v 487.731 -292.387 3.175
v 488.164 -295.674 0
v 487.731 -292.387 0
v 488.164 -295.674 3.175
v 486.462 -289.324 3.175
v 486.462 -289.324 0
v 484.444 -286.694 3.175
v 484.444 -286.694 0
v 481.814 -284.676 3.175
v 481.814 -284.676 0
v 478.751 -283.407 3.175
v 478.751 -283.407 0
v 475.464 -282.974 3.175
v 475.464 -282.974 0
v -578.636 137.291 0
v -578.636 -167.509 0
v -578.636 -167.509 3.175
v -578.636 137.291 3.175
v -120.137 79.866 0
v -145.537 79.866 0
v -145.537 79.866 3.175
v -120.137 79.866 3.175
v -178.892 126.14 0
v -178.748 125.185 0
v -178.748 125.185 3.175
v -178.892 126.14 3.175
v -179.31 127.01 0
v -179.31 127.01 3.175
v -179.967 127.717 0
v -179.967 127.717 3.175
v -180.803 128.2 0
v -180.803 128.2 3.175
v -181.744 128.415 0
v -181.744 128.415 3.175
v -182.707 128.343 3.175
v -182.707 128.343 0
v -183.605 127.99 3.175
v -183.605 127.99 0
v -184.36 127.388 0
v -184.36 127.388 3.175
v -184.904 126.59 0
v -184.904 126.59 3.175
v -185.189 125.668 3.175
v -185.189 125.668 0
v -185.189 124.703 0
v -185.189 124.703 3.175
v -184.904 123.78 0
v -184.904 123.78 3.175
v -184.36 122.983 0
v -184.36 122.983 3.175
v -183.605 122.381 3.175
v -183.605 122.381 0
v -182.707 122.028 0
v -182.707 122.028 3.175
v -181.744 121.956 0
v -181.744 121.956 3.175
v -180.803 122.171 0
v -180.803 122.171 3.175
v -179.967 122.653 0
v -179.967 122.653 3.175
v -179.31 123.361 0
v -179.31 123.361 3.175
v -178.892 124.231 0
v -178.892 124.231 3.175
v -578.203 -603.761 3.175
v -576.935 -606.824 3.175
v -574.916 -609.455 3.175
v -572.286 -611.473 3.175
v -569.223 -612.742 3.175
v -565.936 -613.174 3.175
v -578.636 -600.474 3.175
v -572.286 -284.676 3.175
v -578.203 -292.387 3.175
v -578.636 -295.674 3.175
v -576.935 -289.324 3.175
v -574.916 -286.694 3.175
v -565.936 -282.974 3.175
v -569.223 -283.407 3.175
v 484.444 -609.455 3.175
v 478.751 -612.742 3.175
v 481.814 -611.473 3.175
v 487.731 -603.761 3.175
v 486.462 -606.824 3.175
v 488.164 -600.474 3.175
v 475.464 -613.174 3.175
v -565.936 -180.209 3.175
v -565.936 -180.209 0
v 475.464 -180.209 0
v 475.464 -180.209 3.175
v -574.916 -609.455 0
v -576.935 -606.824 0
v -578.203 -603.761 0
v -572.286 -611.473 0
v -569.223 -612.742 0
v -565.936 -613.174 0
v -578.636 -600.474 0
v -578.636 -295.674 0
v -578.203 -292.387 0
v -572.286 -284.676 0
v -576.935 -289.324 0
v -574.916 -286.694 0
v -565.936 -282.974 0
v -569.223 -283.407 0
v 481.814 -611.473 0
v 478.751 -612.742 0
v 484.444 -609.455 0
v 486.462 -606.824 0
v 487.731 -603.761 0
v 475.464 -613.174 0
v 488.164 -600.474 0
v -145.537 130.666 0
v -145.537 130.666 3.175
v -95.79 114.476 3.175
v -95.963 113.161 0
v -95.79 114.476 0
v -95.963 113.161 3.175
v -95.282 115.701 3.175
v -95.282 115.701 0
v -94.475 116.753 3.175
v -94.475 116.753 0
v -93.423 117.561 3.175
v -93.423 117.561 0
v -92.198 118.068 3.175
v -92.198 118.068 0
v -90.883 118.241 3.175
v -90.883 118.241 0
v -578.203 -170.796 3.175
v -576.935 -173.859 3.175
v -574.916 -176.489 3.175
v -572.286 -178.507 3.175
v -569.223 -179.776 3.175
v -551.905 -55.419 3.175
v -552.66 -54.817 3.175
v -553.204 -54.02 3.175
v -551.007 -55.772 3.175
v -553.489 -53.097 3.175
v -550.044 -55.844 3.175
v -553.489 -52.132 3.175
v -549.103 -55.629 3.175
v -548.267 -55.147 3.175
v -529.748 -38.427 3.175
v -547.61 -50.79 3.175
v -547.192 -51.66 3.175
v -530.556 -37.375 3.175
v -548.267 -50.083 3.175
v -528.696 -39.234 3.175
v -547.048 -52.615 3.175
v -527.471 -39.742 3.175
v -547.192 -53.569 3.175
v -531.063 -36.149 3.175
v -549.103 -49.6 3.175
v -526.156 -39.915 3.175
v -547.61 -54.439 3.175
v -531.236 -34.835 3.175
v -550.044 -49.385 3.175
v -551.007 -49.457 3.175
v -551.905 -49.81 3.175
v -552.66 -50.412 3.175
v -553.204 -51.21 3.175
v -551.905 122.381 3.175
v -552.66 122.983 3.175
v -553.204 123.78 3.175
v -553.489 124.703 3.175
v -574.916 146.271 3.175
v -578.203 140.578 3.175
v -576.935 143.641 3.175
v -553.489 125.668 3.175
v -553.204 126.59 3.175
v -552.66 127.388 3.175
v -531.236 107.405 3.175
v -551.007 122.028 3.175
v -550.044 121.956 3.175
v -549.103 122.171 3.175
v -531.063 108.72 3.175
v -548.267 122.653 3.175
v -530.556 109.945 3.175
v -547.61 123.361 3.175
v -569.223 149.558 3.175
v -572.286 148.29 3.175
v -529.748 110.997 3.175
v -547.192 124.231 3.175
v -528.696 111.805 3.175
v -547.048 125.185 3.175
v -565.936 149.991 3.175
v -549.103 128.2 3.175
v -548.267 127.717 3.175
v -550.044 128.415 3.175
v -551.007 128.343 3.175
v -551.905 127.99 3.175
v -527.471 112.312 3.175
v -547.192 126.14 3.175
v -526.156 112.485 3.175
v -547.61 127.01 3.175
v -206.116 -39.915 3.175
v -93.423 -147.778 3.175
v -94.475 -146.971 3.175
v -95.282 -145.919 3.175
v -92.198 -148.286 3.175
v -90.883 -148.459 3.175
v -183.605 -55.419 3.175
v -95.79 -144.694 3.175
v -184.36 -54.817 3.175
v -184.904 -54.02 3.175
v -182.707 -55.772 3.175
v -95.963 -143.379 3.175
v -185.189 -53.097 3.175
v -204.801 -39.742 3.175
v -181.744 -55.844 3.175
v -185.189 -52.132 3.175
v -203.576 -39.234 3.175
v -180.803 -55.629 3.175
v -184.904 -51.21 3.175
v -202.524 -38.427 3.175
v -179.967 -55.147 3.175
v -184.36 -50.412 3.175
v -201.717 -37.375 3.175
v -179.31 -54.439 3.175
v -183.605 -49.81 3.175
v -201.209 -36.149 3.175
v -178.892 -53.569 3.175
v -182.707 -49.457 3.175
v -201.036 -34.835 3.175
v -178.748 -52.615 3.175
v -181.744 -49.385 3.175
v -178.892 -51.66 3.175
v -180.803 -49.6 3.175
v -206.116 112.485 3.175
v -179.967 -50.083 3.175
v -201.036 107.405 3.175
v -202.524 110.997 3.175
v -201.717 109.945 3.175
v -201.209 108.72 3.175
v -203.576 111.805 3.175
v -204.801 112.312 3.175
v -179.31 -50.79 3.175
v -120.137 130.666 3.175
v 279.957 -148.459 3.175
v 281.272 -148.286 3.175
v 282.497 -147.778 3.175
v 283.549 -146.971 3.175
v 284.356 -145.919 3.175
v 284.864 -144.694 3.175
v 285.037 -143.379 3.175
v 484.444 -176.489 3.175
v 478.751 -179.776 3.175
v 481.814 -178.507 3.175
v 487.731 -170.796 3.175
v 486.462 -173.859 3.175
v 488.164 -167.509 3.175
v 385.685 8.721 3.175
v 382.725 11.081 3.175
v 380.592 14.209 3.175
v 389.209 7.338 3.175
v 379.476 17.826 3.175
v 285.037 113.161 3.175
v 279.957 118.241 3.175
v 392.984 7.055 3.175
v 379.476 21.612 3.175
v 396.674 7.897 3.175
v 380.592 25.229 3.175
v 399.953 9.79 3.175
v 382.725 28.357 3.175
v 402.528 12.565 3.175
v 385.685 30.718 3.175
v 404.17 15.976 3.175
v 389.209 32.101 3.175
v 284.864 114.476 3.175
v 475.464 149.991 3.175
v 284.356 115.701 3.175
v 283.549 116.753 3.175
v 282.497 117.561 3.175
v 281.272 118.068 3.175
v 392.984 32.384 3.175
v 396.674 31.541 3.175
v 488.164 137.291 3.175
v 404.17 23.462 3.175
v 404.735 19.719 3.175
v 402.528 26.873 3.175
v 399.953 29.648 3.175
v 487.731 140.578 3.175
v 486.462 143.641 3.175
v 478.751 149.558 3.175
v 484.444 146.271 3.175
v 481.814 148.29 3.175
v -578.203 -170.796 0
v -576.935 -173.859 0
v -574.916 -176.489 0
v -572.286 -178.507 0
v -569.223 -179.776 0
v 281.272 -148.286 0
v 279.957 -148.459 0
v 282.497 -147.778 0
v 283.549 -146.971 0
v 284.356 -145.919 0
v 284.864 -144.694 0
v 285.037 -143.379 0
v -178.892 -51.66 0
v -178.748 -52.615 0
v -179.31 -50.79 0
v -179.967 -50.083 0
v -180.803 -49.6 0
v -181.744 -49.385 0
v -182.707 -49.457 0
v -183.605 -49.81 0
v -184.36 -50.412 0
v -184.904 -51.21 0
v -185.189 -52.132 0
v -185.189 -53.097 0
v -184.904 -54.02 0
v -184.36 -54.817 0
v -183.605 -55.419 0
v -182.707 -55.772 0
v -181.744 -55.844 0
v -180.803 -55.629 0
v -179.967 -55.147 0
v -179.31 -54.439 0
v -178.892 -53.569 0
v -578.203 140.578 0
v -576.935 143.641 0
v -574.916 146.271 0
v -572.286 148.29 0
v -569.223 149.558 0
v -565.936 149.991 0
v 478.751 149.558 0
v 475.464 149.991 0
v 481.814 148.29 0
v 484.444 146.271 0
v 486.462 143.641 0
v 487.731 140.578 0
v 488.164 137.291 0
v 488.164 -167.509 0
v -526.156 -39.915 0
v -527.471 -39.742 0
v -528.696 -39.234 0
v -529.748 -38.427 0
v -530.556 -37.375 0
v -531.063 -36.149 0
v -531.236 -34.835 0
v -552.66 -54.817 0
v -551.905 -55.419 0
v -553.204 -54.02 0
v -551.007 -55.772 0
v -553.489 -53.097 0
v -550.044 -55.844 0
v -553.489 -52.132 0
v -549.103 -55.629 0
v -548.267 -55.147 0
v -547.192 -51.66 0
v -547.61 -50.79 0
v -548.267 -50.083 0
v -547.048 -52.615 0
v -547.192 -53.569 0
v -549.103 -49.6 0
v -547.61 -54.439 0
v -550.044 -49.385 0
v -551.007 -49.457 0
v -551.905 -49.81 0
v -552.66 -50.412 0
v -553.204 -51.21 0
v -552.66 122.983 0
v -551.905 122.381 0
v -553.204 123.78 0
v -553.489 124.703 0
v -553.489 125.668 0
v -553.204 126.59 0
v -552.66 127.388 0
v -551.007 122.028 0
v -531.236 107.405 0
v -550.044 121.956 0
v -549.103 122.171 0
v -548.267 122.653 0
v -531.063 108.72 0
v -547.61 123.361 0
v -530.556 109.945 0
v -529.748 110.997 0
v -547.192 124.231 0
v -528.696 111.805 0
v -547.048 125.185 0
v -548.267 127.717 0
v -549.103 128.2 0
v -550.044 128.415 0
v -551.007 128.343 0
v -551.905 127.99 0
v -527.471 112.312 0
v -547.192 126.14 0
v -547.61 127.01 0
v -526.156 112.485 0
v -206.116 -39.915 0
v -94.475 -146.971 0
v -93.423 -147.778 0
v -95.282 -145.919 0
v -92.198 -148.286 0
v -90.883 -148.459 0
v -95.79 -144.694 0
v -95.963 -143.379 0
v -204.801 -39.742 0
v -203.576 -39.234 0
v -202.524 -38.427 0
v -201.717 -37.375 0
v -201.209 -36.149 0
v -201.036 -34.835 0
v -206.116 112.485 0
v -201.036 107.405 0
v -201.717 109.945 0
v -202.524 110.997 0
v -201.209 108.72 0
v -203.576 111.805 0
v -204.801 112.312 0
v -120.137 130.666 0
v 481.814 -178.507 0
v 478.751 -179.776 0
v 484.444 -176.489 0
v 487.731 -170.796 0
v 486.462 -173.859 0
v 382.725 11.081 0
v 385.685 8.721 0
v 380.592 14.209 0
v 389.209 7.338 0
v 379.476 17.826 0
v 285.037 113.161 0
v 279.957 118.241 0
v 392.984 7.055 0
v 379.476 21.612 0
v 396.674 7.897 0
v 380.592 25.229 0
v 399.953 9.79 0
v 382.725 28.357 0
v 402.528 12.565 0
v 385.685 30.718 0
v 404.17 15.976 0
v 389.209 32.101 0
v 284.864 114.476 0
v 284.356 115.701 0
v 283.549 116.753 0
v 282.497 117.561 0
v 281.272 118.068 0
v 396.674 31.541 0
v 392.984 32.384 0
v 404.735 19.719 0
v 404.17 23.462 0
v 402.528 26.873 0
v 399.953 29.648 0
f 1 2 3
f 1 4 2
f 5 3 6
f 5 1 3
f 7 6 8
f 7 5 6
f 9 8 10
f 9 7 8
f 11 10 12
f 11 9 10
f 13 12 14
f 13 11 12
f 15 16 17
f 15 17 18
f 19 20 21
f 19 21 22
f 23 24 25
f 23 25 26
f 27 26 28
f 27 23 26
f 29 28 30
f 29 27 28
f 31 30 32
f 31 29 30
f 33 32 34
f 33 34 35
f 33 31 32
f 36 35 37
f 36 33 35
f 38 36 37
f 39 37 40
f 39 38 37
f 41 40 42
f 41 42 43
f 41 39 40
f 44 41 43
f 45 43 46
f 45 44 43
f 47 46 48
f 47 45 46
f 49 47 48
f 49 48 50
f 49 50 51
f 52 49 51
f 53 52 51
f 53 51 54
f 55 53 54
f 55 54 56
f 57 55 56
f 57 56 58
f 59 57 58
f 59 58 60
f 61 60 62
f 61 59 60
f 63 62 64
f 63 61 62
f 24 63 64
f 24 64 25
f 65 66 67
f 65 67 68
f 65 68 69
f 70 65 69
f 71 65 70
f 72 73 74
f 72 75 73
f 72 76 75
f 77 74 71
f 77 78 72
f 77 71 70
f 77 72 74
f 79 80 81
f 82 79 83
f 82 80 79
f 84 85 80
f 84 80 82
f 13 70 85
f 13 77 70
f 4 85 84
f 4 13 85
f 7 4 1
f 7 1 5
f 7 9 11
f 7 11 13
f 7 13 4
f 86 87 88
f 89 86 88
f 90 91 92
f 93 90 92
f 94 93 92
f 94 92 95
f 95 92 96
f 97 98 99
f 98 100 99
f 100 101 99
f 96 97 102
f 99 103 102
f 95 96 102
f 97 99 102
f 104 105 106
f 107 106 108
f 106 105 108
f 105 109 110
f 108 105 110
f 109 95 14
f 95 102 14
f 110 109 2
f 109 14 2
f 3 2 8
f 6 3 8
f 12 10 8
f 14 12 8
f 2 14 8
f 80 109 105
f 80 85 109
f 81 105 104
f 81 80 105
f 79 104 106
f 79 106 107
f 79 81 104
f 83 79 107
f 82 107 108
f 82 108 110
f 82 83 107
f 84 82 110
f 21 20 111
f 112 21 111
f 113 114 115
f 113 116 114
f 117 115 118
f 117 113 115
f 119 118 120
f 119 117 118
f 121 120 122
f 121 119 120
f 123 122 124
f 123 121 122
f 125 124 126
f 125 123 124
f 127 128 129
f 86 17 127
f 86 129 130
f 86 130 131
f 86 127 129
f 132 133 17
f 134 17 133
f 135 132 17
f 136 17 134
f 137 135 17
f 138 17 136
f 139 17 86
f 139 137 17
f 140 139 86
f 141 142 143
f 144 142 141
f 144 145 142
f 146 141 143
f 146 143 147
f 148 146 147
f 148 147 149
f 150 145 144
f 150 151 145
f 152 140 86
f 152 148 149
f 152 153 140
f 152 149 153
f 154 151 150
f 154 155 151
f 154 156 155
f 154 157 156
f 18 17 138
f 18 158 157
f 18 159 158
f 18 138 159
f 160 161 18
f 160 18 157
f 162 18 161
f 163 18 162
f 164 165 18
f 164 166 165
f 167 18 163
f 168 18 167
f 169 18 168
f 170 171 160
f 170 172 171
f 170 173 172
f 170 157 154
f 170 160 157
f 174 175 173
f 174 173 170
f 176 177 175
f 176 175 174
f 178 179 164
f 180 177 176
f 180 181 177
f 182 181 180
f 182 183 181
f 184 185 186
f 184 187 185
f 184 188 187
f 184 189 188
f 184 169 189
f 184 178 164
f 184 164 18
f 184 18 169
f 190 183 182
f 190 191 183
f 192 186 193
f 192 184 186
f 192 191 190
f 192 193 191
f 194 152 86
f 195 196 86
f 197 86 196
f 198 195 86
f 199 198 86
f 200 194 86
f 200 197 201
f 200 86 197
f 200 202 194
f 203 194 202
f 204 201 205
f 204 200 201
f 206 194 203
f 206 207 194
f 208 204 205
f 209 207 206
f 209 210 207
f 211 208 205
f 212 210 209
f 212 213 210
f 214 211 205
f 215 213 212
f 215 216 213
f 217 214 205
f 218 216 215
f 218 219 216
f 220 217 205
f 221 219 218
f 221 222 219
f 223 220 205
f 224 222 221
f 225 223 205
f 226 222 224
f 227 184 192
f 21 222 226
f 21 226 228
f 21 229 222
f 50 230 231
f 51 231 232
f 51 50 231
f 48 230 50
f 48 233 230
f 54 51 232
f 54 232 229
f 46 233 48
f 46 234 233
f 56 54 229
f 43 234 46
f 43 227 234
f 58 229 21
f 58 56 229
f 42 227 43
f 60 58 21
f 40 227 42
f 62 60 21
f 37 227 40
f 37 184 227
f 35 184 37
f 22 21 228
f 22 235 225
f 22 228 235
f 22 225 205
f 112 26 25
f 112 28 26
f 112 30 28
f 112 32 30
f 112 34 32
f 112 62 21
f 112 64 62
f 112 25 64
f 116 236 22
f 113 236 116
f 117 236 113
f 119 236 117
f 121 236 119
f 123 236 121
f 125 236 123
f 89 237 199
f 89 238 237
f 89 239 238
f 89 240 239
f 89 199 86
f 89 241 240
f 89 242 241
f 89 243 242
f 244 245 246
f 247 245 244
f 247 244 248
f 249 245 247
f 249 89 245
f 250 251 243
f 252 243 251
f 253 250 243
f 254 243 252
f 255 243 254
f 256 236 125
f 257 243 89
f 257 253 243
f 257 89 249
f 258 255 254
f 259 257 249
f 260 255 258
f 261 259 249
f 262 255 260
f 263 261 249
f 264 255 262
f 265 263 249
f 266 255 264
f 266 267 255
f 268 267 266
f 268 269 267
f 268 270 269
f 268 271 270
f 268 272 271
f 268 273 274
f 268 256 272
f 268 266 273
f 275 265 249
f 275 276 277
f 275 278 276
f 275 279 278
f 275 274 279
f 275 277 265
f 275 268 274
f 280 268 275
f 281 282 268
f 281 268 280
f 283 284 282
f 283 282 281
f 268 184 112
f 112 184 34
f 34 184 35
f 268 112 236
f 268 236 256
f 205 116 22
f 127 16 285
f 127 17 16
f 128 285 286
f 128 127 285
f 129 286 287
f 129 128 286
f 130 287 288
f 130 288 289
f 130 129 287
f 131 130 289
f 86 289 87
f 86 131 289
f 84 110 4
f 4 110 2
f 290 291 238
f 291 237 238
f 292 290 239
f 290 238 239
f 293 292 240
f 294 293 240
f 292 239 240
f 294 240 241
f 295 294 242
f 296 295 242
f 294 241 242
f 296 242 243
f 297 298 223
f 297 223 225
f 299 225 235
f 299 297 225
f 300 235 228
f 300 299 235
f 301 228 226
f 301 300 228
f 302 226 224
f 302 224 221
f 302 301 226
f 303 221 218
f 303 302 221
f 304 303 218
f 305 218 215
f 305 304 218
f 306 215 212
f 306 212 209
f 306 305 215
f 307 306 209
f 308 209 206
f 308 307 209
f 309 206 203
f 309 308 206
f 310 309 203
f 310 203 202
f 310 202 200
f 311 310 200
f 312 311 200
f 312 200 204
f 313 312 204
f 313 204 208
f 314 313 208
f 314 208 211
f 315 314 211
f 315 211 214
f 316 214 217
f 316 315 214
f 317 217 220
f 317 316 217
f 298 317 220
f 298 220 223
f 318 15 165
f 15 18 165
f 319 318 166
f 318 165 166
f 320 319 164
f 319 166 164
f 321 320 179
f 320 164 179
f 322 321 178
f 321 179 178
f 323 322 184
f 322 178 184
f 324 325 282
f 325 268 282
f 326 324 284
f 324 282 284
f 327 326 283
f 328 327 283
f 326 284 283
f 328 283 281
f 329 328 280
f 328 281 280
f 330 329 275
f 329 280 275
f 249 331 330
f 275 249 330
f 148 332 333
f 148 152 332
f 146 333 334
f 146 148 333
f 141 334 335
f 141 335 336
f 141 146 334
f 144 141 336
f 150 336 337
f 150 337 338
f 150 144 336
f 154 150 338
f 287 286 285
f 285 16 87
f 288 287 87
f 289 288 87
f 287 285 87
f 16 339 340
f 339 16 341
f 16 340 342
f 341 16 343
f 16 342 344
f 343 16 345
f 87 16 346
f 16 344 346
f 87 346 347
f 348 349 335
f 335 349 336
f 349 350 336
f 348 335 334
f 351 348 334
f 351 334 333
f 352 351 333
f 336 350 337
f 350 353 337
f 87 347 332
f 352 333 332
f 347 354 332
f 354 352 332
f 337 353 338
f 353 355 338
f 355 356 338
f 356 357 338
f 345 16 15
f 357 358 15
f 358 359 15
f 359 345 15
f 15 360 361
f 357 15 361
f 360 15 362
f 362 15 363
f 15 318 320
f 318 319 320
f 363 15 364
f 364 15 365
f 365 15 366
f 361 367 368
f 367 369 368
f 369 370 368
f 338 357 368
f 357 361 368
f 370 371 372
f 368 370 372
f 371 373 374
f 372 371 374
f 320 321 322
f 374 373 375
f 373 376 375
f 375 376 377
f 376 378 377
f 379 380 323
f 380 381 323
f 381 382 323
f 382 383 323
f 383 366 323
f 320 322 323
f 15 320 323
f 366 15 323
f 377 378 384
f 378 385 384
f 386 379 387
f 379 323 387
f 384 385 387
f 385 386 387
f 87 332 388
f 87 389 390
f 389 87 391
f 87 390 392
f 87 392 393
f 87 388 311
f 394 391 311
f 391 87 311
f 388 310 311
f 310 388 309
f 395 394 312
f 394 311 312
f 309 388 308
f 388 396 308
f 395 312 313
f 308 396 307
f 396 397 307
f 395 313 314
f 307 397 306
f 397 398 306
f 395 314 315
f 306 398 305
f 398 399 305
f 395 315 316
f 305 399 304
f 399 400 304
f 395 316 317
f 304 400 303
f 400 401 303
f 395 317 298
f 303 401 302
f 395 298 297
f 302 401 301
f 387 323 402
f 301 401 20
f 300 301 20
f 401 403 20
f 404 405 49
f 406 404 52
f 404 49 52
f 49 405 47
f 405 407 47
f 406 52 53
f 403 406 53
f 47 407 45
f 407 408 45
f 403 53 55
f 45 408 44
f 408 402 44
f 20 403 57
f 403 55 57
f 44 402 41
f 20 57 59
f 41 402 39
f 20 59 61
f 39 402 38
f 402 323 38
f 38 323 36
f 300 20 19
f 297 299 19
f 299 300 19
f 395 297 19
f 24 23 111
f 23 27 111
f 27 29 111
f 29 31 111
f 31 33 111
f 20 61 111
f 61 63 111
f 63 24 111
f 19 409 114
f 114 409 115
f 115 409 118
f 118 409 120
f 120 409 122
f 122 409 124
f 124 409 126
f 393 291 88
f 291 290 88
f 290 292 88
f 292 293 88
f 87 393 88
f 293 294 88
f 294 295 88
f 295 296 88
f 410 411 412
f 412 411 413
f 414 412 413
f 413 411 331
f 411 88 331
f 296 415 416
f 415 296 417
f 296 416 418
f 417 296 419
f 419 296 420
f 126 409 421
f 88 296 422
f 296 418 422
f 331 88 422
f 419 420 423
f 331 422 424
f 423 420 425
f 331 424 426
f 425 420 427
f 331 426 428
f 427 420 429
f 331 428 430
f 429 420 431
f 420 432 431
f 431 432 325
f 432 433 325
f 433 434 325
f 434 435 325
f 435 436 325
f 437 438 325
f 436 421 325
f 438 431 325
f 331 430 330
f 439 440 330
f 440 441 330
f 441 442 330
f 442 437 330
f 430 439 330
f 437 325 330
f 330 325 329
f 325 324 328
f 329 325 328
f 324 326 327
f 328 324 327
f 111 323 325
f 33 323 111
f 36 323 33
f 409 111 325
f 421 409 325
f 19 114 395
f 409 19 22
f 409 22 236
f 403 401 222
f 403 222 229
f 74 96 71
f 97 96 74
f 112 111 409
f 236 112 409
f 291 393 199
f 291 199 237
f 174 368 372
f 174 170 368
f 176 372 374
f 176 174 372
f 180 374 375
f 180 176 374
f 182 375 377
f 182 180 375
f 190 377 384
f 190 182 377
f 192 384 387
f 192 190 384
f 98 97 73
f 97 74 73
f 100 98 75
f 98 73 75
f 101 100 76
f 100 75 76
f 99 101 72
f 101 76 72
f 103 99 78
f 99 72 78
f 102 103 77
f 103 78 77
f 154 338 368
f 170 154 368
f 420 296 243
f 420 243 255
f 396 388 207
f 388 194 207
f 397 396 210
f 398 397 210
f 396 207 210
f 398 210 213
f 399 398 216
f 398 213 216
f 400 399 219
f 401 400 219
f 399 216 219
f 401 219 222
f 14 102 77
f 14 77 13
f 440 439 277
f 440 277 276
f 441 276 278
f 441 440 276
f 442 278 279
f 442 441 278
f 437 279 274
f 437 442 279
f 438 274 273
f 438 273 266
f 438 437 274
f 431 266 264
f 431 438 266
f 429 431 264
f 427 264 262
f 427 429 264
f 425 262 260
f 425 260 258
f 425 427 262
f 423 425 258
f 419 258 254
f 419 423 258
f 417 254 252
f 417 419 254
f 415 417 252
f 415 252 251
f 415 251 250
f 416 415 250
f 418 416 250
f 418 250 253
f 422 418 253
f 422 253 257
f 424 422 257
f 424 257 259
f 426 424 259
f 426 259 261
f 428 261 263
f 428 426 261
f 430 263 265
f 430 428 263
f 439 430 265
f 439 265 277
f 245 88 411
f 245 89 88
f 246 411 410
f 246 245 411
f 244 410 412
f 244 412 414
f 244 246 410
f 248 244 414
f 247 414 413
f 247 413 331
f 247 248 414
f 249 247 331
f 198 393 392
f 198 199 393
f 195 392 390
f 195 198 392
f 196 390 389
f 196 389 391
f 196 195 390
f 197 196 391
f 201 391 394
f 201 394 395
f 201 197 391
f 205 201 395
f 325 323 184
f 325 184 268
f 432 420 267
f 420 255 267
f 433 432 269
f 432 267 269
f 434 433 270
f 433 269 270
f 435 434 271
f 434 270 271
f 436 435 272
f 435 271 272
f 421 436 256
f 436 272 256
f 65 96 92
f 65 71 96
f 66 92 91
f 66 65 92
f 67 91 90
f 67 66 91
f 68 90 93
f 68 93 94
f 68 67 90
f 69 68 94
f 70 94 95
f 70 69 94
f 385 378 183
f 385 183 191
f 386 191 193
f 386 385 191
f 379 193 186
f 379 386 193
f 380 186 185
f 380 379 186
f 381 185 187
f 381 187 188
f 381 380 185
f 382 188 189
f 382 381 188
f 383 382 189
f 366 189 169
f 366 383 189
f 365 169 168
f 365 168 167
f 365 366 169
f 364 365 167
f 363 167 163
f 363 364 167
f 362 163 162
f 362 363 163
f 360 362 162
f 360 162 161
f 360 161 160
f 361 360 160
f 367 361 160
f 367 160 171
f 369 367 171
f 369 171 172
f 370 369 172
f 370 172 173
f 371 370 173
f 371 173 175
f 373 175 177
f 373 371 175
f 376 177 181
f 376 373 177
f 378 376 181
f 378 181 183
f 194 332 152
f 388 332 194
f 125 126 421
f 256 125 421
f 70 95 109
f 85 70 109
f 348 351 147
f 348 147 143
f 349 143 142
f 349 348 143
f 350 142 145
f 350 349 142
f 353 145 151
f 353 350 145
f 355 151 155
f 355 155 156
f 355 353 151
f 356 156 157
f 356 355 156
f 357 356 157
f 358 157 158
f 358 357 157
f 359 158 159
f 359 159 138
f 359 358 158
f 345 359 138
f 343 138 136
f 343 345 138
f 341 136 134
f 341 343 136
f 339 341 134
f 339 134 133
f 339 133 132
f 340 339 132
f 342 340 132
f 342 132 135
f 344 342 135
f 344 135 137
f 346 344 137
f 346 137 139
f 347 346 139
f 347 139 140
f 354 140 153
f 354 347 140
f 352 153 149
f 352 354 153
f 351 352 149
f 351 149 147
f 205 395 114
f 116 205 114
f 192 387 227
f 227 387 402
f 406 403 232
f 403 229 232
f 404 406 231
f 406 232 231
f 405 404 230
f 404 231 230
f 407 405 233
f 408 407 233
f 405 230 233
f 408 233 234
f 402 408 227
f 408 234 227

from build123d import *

# Parameters (mm, degrees)
F0_W     = 1066.8
F0_H     = 330.2
F0_R     = 3.2385
F0_W_2   = 330.2
F0_H_2   = 152.4
F0_W_3   = 25.4
F0_H_3   = 50.8
F0_W_4   = 381
F0_H_4   = 266.7
F0_R_2   = 12.7
F1_DEPTH = 3.175
F2_DEPTH = 3.175
F3_R     = 5.08
F4_R     = 12.7
F4_2_R   = 12.7


with BuildPart() as f1:
    # F0 (on Top) → F1 (new body)
    with BuildSketch(Plane.XY):
        with Locations((-45.236103, -15.10883)):
            Rectangle(F0_W, F0_H)
        with Locations((-550.286172, -52.614683)):
            Circle(F0_R, mode=Mode.SUBTRACT)
        with Locations((-181.986172, -52.614683)):
            Circle(F0_R, mode=Mode.SUBTRACT)
        with Locations((-366.136172, 36.285317)):
            Rectangle(F0_W_2, F0_H_2, mode=Mode.SUBTRACT)
        with Locations((-550.286172, 125.185317)):
            Circle(F0_R, mode=Mode.SUBTRACT)
        with Locations((-181.986172, 125.185317)):
            Circle(F0_R, mode=Mode.SUBTRACT)
        with Locations((-132.837489, 105.265893)):
            Rectangle(F0_W_3, F0_H_3, mode=Mode.SUBTRACT)
        with Locations((94.536968, -15.10883)):
            Rectangle(F0_W_4, F0_H_4, mode=Mode.SUBTRACT)
        with Locations((392.03462, 19.719087)):
            Circle(F0_R_2, mode=Mode.SUBTRACT)
    extrude(amount=F1_DEPTH)

    # F3
    f3_edges = [f1.edges().sort_by_distance(p)[0] for p in [
        (-531.236172, 112.485317, 1.5875),
        (-531.236172, -39.914683, 1.5875),
        (-201.036172, -39.914683, 1.5875),
        (-201.036172, 112.485317, 1.5875),
        (-95.963032, 118.24117, 1.5875),
        (-95.963032, -148.45883, 1.5875),
        (285.036968, -148.45883, 1.5875),
        (285.036968, 118.24117, 1.5875),
    ]]
    fillet(f3_edges, radius=F3_R)

    # F4
    f4_edges = [f1.edges().sort_by_distance(p)[0] for p in [
        (-578.636103, 149.99117, 1.5875),
        (-578.636103, -180.20883, 1.5875),
        (488.163897, -180.20883, 1.5875),
        (488.163897, 149.99117, 1.5875),
    ]]
    fillet(f4_edges, radius=F4_R)


with BuildPart() as f2:
    # F0 (on Top) → F2 (new body)
    with BuildSketch(Plane.XY):
        with Locations((-45.236103, -448.074284)):
            Rectangle(F0_W, F0_H)
    extrude(amount=F2_DEPTH)

    # F4#2
    f4_2_edges = [f2.edges().sort_by_distance(p)[0] for p in [
        (-578.636103, -282.974284, 1.5875),
        (-578.636103, -613.174284, 1.5875),
        (488.163897, -613.174284, 1.5875),
        (488.163897, -282.974284, 1.5875),
    ]]
    fillet(f4_2_edges, radius=F4_2_R)


solid = Compound([f1.part, f2.part])
